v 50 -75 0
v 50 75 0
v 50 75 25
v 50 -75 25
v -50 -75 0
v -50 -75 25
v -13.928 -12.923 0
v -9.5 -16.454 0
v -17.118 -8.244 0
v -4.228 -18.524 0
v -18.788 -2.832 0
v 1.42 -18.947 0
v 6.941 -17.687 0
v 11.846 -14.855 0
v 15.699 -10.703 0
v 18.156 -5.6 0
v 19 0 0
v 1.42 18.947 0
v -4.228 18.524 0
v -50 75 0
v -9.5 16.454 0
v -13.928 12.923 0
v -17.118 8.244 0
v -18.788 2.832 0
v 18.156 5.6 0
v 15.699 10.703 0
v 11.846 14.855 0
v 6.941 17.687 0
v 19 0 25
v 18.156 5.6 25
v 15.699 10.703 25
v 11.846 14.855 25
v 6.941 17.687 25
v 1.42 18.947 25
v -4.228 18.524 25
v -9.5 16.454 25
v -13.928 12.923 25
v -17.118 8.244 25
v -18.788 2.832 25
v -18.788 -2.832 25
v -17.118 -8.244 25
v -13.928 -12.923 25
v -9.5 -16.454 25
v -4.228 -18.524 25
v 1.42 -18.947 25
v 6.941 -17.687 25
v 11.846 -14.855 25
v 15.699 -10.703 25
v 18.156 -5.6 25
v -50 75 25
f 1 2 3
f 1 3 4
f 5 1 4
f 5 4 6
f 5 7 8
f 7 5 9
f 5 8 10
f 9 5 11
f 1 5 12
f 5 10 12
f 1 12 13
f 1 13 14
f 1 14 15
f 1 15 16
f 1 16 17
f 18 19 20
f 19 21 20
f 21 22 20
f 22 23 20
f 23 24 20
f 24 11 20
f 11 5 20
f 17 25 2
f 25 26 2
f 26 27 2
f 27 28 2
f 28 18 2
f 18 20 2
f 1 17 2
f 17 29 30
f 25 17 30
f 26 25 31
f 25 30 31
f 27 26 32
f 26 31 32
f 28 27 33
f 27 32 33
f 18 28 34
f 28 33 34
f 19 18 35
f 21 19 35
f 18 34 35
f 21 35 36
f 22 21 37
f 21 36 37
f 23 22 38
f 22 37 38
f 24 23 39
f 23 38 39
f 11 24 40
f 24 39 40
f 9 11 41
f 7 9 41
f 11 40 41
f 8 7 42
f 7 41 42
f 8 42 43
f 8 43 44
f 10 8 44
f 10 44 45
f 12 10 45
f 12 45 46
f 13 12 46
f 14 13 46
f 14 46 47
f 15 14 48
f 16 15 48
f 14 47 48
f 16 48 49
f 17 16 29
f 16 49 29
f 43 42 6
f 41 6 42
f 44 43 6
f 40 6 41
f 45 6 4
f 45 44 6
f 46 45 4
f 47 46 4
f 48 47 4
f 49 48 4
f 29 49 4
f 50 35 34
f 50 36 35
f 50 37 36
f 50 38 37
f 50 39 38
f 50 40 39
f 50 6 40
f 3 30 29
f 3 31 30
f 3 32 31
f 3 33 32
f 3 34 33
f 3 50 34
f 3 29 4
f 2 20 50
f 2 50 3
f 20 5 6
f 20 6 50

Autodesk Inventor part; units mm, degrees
ref_plane "YZ Plane" through (0, 0, 0) normal (1, 0, 0) x (0, 1, 0)
ref_plane "XZ Plane" through (0, 0, 0) normal (0, 1, 0) x (-1, 0, 0)
ref_plane "XY Plane" through (0, 0, 0) normal (0, 0, 1) x (1, 0, 0)
sketch "Sketch1" plane through (0, 0, 0) normal (0, 0, 1) x (1, 0, 0)
  line L0 (-50, 75) -> (50, 75)
  line L1 (50, 75) -> (50, -75)
  line L2 (50, -75) -> (-50, -75)
  line L3 (-50, -75) -> (-50, 75)
  point P0 (0, 0)
  point P1 (0, 75)
  point P2 (-50, 0)
  dimension "d0" = 100
  dimension "d1" = 150
extrude "Extrusion1" add sketch "Sketch1" along normal blind 25
sketch "Sketch2" plane through (0, 0, 25) normal (0, 0, 1) x (1, 0, 0)
  line L0 (50, 75) -> (-50, 75) projected
  line L1 (-50, -75) -> (50, -75) projected
  line L2 (-50, 75) -> (50, -75) construction
  circle A0 centre (0, 0) radius 19
  dimension "d4" = 38
extrude "Extrusion2" cut sketch "Sketch2" against normal through all
properties part number "Foam_Top_Big_Mic" material "Polystyrene, Expanded"
